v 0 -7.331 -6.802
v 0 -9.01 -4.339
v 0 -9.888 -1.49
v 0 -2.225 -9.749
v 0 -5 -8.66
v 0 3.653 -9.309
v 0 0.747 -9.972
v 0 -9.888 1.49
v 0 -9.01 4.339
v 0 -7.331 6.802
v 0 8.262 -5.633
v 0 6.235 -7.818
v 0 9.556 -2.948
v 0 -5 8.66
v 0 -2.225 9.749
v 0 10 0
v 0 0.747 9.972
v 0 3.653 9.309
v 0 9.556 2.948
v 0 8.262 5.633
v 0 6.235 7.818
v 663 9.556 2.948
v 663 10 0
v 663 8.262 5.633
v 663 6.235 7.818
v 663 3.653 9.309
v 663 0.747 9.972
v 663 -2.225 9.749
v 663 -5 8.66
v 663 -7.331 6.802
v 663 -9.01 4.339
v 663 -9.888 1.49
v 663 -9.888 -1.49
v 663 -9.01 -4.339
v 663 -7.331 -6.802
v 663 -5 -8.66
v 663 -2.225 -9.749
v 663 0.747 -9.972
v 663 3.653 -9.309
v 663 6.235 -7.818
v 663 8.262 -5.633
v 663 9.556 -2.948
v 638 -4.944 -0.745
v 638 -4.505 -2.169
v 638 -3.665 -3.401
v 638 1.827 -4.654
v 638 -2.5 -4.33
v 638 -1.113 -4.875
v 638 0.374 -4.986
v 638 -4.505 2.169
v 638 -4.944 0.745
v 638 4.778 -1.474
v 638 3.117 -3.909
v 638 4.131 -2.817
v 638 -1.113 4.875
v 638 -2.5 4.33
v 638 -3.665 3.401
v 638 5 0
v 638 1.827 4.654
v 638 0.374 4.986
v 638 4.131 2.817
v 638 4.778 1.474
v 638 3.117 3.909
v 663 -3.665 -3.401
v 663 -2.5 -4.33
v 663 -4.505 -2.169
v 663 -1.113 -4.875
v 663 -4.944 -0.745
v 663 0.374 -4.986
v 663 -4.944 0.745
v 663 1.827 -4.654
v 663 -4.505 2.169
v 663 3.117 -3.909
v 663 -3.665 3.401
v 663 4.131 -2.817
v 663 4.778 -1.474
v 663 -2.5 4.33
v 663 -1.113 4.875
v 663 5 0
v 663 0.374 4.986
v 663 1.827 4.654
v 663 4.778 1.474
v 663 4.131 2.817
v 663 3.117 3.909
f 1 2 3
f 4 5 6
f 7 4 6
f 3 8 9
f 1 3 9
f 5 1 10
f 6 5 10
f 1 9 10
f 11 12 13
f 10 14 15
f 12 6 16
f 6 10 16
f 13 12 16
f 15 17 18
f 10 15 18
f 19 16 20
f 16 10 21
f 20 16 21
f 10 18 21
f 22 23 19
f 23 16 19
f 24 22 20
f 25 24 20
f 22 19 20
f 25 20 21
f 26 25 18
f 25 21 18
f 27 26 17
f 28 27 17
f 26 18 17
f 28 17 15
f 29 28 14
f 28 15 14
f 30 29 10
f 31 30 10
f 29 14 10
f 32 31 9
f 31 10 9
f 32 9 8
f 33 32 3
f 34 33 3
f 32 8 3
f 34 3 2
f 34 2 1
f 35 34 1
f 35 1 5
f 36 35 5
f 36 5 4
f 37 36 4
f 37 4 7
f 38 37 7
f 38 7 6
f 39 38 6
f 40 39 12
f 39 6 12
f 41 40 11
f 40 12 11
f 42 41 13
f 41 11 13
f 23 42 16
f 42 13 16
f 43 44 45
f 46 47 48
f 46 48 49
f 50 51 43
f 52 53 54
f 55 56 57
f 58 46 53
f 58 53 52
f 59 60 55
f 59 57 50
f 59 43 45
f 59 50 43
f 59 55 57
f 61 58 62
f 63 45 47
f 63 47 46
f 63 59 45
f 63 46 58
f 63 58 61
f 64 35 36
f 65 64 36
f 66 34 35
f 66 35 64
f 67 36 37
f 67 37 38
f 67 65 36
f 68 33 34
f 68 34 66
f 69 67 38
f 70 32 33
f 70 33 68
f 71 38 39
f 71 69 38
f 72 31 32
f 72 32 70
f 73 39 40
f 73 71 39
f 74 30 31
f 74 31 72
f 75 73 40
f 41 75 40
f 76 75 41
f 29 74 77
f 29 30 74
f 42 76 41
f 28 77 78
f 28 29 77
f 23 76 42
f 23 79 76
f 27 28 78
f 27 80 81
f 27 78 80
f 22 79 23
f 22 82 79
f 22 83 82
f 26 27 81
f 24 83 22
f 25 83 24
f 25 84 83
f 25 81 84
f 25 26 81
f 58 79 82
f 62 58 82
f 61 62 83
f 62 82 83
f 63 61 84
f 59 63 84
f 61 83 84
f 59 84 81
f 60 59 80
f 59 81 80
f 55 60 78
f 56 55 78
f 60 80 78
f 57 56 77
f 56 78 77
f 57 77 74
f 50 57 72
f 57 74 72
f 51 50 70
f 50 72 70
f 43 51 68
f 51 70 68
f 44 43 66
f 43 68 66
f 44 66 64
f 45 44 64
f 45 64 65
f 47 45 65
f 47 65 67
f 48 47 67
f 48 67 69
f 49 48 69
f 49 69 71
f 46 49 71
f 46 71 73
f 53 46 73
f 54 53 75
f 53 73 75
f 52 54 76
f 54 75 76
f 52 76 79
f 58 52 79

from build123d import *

# Parameters (mm, degrees)
F0_R      = 10
F1_DEPTH  = 638
F1_FACE_R = 10
F2_DEPTH  = 25
F3_R      = 5
F4_DEPTH  = 25


with BuildPart() as f1:
    # F0 (on Right) → F1 (new body)
    with BuildSketch(Plane.YZ):
        Circle(F0_R)
    extrude(amount=F1_DEPTH)

    # F1_face (on face) → F2 (join)
    with BuildSketch(Plane.YZ.offset(638)):
        Circle(F1_FACE_R)
    extrude(amount=F2_DEPTH)

    # F3 (on face) → F4 (cut)
    with BuildSketch(Plane.YZ.offset(663)):
        Circle(F3_R)
    extrude(amount=-F4_DEPTH, mode=Mode.SUBTRACT)


solid = f1.part
